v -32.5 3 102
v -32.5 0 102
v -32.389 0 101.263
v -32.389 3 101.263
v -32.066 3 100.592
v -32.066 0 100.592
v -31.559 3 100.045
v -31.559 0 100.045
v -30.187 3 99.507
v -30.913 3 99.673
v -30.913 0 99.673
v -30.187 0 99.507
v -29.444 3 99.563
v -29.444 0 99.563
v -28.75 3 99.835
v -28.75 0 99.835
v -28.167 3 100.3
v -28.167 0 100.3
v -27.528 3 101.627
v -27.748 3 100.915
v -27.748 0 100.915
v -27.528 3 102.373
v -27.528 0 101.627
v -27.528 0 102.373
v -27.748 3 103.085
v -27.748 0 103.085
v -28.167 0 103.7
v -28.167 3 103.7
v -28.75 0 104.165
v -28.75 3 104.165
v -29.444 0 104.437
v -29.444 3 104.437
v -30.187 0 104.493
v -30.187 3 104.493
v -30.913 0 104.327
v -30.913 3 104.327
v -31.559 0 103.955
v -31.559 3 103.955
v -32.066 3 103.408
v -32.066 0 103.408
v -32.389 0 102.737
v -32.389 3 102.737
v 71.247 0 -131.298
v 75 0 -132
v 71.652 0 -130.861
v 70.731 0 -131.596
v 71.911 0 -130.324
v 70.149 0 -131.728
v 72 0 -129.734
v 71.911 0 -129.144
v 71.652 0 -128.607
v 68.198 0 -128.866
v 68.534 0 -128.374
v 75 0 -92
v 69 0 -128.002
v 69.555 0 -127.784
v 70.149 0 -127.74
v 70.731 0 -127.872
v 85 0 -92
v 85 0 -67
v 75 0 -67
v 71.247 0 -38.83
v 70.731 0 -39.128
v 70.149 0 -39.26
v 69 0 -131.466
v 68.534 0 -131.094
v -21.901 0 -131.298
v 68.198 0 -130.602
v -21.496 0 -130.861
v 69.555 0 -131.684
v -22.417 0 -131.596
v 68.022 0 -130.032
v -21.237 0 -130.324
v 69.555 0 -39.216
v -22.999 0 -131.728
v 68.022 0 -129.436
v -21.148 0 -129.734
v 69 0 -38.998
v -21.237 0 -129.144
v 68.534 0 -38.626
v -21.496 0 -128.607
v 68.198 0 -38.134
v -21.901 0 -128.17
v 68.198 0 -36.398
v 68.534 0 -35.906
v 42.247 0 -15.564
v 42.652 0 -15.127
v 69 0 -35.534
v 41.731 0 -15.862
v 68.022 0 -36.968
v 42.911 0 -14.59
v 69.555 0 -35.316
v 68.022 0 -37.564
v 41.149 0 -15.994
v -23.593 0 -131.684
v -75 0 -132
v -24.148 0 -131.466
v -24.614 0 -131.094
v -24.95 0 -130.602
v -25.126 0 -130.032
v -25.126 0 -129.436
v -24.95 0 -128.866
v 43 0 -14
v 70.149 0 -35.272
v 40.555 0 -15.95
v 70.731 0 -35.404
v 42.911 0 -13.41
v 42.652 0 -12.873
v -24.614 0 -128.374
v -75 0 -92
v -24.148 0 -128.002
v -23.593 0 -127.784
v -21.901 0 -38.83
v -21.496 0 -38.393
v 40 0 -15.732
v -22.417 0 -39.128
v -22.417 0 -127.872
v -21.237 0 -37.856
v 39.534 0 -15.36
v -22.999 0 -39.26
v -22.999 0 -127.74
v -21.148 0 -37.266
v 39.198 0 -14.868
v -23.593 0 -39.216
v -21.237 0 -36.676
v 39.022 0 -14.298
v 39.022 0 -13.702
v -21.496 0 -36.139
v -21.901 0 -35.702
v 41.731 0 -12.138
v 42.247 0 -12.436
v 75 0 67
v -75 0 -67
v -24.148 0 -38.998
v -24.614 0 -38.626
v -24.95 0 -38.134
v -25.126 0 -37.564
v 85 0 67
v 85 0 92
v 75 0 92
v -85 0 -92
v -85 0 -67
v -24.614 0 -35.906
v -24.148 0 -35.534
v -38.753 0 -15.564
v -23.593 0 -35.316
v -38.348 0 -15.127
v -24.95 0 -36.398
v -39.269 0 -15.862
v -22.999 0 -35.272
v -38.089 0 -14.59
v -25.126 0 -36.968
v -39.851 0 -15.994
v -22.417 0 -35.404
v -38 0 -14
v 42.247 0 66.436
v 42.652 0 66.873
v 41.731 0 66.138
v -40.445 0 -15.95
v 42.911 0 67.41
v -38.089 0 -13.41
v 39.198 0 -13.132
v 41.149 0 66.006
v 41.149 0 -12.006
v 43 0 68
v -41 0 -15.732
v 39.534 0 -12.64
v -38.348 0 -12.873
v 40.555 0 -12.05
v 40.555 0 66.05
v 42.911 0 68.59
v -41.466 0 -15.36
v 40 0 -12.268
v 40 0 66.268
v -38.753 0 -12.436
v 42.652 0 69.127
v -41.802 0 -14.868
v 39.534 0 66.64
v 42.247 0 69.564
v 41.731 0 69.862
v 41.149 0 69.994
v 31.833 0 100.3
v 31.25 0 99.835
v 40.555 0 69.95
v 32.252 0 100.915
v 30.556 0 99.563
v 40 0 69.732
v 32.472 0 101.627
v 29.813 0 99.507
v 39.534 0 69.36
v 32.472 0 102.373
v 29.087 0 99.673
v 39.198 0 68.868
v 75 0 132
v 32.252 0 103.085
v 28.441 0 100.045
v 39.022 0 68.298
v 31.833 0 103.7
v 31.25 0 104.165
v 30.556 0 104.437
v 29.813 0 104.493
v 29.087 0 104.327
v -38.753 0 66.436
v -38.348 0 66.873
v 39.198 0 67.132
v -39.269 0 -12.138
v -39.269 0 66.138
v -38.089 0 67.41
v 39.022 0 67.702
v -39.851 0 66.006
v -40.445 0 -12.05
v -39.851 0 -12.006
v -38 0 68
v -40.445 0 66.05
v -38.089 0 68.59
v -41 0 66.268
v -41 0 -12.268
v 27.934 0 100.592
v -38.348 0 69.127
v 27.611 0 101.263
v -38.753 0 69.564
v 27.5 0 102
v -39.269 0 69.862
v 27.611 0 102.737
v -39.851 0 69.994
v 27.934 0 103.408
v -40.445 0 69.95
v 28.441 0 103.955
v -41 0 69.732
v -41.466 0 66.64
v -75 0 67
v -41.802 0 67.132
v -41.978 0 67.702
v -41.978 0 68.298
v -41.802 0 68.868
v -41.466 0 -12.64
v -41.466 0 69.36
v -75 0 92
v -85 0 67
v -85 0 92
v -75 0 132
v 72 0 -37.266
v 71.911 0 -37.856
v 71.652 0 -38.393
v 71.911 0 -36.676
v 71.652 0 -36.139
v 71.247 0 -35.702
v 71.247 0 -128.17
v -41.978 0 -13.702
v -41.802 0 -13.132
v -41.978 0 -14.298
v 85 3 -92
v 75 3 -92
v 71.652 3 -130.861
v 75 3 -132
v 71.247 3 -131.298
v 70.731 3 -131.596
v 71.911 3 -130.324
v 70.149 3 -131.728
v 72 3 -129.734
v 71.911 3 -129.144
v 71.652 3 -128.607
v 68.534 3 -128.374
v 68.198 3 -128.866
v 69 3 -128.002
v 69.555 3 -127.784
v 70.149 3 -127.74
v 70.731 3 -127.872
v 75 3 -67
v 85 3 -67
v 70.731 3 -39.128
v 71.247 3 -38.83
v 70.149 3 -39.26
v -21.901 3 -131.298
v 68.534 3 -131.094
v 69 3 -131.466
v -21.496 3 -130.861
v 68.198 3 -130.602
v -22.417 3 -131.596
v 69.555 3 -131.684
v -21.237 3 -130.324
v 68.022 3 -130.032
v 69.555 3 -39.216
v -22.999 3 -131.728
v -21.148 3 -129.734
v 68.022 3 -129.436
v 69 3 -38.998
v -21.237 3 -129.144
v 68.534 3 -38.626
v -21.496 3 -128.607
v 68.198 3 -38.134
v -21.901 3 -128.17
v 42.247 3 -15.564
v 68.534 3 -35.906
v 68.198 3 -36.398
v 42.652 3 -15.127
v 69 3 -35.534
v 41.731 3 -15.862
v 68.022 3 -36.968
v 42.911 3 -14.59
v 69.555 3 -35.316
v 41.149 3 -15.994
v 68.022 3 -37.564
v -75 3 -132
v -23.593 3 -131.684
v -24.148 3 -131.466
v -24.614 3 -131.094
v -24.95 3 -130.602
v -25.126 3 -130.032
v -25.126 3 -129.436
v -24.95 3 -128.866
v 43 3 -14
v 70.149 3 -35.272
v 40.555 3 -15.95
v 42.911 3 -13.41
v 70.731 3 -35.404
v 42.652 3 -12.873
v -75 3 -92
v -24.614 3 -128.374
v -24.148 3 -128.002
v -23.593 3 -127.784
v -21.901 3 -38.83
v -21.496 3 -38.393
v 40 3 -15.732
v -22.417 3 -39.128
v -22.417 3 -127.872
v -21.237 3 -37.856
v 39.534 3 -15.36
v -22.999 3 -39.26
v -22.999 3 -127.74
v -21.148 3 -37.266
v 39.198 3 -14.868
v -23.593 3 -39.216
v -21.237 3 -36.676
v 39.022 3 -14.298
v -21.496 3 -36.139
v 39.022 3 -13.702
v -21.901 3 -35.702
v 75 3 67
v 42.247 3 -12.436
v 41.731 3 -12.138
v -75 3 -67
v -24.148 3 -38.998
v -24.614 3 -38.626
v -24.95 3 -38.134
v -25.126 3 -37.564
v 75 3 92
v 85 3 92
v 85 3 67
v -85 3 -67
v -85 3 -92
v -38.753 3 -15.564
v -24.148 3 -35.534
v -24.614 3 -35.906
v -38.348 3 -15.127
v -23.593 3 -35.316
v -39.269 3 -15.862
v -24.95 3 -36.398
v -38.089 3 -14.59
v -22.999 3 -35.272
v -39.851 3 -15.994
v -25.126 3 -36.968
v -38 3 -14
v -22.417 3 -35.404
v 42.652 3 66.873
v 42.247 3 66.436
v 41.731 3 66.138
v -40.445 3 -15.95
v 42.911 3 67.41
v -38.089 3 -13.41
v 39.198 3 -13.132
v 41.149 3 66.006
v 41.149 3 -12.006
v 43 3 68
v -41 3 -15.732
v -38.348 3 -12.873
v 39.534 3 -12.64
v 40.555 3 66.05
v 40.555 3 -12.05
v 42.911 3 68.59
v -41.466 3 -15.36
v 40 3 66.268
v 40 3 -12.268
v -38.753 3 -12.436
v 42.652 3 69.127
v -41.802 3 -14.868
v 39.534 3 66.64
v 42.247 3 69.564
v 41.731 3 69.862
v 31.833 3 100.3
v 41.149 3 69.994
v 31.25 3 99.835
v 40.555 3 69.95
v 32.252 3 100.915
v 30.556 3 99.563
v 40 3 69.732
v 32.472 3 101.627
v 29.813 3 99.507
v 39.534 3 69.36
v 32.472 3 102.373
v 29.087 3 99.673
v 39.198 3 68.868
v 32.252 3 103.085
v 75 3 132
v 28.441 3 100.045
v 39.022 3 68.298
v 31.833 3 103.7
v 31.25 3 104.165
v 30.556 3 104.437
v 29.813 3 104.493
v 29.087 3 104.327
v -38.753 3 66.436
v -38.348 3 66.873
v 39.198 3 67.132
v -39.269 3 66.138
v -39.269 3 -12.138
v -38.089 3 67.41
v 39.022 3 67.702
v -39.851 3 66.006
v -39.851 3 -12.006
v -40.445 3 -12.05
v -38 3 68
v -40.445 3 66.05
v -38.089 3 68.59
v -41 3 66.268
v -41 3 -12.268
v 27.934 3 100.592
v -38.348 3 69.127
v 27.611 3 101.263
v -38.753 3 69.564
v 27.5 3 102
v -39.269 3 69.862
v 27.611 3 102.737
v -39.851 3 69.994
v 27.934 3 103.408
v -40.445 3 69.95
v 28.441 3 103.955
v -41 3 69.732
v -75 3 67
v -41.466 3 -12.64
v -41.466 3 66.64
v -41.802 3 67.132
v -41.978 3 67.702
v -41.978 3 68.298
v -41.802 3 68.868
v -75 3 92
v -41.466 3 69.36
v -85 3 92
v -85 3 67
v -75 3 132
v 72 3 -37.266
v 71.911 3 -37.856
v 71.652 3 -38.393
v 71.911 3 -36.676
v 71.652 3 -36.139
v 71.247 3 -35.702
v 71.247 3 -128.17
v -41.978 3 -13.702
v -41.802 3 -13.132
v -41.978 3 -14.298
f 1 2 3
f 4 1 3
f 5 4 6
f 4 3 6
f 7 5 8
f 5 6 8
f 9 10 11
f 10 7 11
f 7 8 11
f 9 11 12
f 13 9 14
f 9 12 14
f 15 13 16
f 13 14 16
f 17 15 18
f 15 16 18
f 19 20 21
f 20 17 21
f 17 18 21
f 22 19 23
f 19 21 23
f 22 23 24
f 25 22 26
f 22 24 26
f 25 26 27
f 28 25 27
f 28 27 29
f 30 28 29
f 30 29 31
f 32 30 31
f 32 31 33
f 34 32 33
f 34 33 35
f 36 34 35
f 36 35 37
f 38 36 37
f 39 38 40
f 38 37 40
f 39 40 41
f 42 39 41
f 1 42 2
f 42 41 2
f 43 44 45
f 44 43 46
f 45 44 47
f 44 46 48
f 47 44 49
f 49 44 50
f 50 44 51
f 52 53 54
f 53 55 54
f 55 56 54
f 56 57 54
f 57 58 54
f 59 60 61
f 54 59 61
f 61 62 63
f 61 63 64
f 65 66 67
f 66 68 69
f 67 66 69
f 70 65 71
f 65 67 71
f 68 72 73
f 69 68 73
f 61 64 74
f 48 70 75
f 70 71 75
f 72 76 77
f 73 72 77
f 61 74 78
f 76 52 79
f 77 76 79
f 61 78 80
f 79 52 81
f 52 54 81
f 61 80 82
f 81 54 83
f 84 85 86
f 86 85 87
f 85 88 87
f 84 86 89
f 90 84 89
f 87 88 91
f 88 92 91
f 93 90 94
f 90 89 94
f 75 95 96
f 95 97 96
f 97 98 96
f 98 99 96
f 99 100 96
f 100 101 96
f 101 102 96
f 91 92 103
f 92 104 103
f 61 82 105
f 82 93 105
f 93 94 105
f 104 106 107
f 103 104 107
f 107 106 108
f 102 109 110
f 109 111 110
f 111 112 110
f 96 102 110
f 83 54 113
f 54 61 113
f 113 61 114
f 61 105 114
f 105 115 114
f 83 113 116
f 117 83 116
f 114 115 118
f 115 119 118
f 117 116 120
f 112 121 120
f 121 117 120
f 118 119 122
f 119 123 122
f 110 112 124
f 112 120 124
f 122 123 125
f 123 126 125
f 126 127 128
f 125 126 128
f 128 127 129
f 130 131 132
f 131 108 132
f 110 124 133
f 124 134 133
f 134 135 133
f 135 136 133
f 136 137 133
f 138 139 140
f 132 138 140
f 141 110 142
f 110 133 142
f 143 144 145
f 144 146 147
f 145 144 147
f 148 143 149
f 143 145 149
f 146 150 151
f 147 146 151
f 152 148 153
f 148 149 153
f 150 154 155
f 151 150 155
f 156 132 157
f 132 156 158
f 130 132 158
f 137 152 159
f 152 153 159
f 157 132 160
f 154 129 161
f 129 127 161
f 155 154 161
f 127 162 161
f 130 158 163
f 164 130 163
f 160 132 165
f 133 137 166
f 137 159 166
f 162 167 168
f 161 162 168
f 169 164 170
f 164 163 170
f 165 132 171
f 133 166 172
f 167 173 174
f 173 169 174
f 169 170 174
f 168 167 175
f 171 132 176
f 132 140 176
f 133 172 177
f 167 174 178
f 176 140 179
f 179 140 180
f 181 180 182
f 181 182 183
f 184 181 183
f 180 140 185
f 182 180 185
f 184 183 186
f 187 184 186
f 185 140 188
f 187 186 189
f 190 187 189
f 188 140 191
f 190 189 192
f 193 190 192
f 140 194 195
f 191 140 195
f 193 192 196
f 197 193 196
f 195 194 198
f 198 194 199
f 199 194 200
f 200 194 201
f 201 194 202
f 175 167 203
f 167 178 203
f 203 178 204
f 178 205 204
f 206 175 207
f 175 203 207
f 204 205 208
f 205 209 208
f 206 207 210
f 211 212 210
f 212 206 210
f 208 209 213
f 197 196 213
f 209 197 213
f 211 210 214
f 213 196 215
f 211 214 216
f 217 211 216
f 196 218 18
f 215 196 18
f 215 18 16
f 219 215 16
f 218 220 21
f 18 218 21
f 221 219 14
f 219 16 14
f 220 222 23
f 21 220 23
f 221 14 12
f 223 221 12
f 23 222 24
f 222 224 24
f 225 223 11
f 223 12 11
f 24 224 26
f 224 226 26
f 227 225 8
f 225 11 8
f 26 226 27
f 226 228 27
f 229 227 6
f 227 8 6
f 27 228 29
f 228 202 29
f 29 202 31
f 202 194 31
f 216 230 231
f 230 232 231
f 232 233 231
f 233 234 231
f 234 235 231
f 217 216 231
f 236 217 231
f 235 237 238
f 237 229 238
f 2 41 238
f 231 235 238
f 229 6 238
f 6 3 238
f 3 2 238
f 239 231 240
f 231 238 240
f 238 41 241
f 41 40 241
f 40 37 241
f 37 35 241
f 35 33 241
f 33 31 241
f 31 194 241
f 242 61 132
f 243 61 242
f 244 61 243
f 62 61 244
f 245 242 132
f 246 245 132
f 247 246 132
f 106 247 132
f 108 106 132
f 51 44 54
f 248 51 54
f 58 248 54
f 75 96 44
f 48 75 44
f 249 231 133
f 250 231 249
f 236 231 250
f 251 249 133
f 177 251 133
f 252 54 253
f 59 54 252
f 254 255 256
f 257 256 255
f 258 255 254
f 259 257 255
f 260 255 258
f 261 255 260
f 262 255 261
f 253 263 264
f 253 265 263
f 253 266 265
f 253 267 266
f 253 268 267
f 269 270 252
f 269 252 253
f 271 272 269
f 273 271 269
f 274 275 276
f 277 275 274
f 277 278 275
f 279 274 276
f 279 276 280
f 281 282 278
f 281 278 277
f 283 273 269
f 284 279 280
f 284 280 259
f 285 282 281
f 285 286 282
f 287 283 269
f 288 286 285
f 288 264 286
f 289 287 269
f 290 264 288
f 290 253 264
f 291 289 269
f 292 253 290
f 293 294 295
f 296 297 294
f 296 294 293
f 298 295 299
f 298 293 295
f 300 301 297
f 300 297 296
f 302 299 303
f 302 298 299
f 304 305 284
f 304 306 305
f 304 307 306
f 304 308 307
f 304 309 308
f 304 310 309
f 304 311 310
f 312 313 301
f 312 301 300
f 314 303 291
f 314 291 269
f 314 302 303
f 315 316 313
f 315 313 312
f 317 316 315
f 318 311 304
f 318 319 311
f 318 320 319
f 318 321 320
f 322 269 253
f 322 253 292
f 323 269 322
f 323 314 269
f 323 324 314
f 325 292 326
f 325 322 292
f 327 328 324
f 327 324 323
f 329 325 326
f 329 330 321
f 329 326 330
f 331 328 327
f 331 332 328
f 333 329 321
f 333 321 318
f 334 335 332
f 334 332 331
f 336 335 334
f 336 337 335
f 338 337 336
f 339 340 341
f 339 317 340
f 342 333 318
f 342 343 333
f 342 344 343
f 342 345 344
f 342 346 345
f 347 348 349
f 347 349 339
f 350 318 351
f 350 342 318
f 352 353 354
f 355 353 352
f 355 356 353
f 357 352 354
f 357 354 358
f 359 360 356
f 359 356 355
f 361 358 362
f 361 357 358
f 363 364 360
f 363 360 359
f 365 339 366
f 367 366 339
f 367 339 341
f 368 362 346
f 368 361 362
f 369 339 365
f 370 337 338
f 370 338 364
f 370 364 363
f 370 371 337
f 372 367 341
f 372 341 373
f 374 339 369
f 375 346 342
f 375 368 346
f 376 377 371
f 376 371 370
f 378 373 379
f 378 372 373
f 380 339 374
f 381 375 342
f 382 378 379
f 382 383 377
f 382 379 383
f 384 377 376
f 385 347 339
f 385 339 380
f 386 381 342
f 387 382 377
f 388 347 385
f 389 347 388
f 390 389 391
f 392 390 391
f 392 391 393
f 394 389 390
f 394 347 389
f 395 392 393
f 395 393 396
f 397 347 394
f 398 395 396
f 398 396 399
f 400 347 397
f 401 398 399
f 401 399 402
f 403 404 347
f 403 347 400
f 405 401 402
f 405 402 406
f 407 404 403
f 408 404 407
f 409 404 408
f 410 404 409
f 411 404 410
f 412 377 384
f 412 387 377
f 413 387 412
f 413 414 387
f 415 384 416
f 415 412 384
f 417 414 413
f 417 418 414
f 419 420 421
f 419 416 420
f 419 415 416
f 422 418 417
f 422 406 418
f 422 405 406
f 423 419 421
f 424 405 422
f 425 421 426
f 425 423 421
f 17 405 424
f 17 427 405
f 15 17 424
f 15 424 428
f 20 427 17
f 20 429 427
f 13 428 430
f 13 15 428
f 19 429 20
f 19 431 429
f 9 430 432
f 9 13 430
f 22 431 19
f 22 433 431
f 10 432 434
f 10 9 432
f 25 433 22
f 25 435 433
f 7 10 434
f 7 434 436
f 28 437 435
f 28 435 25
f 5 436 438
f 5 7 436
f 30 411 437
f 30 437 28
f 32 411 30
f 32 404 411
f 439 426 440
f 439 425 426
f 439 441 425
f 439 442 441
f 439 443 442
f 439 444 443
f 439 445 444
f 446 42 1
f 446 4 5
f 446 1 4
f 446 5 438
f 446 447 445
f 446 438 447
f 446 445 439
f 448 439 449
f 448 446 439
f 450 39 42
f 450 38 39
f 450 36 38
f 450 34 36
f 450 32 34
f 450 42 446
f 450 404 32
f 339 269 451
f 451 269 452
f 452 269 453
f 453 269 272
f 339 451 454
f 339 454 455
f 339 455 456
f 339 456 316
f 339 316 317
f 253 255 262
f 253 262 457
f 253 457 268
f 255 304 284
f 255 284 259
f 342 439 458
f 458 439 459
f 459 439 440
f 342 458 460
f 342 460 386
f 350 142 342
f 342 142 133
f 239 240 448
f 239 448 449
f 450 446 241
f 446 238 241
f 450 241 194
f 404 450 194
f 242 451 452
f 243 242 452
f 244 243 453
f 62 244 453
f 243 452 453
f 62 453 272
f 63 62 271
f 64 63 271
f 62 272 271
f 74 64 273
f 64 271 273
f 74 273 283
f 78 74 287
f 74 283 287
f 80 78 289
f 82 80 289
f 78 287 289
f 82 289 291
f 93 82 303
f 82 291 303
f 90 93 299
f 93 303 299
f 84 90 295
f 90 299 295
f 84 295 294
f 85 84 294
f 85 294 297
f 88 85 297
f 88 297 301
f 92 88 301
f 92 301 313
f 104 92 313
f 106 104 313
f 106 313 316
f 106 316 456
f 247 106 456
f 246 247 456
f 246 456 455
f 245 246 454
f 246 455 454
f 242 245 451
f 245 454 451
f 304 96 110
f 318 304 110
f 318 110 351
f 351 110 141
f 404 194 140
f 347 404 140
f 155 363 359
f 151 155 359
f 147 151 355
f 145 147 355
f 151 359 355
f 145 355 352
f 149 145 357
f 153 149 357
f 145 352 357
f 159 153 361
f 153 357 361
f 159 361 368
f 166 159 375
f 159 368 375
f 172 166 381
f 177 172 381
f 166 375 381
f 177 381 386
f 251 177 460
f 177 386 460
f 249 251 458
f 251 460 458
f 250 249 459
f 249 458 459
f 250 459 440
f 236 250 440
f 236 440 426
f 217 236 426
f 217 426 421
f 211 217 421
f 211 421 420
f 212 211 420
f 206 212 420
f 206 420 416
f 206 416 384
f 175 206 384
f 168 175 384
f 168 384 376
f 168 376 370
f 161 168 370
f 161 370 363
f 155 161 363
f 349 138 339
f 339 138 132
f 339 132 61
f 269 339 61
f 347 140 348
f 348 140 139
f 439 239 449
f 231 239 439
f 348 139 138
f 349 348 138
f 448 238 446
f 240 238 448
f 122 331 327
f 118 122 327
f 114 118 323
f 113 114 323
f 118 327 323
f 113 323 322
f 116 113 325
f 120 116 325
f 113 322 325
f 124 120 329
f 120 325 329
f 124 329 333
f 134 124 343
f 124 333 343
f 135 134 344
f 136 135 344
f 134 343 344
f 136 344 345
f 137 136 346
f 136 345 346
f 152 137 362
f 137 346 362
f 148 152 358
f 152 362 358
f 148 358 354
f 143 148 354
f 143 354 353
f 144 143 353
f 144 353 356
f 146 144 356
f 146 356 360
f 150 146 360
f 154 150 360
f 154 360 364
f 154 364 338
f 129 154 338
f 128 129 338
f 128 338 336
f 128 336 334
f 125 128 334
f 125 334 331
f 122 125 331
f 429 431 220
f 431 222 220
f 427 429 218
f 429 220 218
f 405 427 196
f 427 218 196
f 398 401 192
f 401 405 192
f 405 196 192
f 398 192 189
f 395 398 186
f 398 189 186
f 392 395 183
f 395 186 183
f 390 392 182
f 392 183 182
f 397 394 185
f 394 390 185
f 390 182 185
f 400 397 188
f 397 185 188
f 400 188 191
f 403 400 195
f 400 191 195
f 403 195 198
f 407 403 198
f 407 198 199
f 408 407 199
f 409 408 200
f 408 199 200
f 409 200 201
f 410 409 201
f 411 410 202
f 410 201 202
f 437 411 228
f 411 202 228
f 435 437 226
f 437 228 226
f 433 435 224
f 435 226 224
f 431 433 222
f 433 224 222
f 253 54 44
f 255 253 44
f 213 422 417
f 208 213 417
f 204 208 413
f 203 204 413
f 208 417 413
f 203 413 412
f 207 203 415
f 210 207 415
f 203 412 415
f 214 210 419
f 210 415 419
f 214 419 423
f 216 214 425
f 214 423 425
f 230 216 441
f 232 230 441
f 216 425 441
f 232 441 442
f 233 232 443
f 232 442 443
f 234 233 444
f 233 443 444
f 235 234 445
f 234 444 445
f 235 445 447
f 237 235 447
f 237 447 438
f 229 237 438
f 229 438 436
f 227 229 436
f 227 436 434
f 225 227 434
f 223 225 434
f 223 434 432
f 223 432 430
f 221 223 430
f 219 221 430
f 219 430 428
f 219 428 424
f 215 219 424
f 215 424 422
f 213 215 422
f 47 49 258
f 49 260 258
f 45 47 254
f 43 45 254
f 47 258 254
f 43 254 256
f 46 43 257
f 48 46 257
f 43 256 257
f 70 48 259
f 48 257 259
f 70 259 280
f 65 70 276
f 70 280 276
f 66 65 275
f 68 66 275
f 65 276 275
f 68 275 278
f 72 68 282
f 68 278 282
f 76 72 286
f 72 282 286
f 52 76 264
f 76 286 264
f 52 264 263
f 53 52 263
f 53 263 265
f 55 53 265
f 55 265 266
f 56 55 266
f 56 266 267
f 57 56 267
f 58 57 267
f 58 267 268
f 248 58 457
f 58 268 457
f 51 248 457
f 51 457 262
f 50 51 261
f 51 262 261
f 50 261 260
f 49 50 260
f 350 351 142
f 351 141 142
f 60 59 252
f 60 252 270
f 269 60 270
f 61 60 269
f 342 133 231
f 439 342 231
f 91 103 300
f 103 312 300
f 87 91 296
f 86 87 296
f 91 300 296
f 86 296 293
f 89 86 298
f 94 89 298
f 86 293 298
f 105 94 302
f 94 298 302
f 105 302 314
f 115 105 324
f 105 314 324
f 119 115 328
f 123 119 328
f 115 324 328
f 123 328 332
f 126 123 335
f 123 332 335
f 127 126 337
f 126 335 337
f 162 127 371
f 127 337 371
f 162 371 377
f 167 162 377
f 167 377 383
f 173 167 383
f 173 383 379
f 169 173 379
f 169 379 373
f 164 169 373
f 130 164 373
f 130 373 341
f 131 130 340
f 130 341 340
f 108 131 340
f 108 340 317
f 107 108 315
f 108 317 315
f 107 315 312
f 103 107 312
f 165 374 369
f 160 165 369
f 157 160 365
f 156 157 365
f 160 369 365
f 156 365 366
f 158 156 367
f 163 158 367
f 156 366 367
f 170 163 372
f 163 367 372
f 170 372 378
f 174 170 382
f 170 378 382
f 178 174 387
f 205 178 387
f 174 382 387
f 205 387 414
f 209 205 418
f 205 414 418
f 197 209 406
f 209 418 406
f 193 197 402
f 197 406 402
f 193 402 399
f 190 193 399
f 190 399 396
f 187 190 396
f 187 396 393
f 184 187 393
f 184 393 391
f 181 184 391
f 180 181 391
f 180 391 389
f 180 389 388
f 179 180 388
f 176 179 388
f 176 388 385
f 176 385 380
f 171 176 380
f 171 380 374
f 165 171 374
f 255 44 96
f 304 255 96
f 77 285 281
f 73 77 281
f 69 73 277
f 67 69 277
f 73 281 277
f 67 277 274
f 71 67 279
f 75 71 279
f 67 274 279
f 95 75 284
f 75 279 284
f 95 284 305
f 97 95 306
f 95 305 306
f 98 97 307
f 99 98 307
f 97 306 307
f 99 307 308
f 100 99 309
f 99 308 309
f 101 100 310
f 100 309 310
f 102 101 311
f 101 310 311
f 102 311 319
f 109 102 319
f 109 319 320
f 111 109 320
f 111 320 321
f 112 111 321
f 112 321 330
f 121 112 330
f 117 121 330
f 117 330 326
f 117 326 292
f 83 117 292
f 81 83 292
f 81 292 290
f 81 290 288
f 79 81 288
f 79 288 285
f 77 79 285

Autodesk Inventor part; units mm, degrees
ref_plane "YZ Plane" through (0, 0, 0) normal (1, 0, 0) x (0, 1, 0)
ref_plane "XZ Plane" through (0, 0, 0) normal (0, 1, 0) x (-1, 0, 0)
ref_plane "XY Plane" through (0, 0, 0) normal (0, 0, 1) x (1, 0, 0)
sketch "Sketch1" plane through (0, 0, 0) normal (0, 1, 0) x (-1, 0, 0)
  line L0 (75, 132) -> (-75, 132)
  line L1 (-75, -132) -> (75, -132)
  line L2 (75, 132) -> (-75, -132) construction
  line L3 (-75, 132) -> (75, -132) construction
  line L4 (75, 92) -> (85, 92)
  line L5 (85, 92) -> (85, 67)
  line L6 (85, 67) -> (75, 67)
  line L7 (75, 92) -> (75, 132)
  line L8 (0, 0) -> (94, 0)
  line L9 (75, -92) -> (85, -92)
  line L10 (85, -92) -> (85, -67)
  line L11 (85, -67) -> (75, -67)
  line L12 (75, -132) -> (75, -92)
  line L13 (75, -67) -> (75, 67)
  line L14 (-75, 92) -> (-85, 92)
  line L15 (-85, 92) -> (-85, 67)
  line L16 (-85, 67) -> (-75, 67)
  line L17 (-75, 132) -> (-75, 92)
  line L18 (-75, -92) -> (-85, -92)
  line L19 (-85, -92) -> (-85, -67)
  line L20 (-85, -67) -> (-75, -67)
  line L21 (-75, 67) -> (-75, -67)
  line L22 (-75, -92) -> (-75, -132)
  circle A0 centre (30, 102) radius 2.5
  circle A1 centre (-30, 102) radius 2.5
  dimension "d0" = 264
  dimension "d1" = 150
  dimension "d4" = 10
  dimension "d5" = 25
  dimension "d6" = 40
  dimension "d7" = 10
  dimension "d8" = 9
  dimension "d9" = 10
  dimension "d10" = 25
  dimension "d11" = 40
  dimension "d12" = 160
  dimension "d17" = 5
  dimension "d18" = 5
  dimension "d19" = 30
  dimension "d20" = 30
  dimension "d21" = 45
  dimension "d22" = 45
extrude "Extrusion1" add sketch "Sketch1" along normal blind 3
sketch "Sketch2" plane through (0, 3, 0) normal (0, 1, 0) x (1, 0, 0)
  line L0 (-86, -72) -> (86, -72)
  line L1 (-75, -132) -> (75, -132) projected
  line L2 (45, -72) -> (45, 18)
  line L3 (75, -67) -> (75, 67) projected
  line L4 (45, 18) -> (-44, 18)
  line L5 (-44, 18) -> (-44, -72)
  line L6 (-75, 67) -> (-75, -67) projected
  circle A0 centre (41, -68) radius 2
  circle A1 centre (41, 14) radius 2
  circle A2 centre (-40, 14) radius 2
  circle A3 centre (-40, -68) radius 2
  circle A4 centre (70, 129.734) radius 2
  line L7 (75, 132) -> (-75, 132) projected
  circle A5 centre (70, 37.266) radius 2
  circle A6 centre (-23.148, 129.734) radius 2
  circle A7 centre (-23.148, 37.266) radius 2
  point P0 (0, 0)
  dimension "d15" = 60
  dimension "d16" = 30
  dimension "d23" = 90
  dimension "d25" = 4
  dimension "d26" = 4
  dimension "d27" = 4
  dimension "d28" = 4
  dimension "d29" = 4
  dimension "d30" = 4
  dimension "d31" = 4
  dimension "d32" = 4
  dimension "d33" = 4
  dimension "d34" = 4
  dimension "d35" = 4
  dimension "d36" = 4
  dimension "d39" = 89
  dimension "d40" = 4
  dimension "d41" = 5
  dimension "d42" = 2.266
  dimension "d43" = 4
  dimension "d44" = 5
  dimension "d45" = 92.468
  dimension "d46" = 4
  dimension "d47" = 4
  dimension "d48" = 93.148
  dimension "d49" = 93.148
  dimension "d50" = 2.266
  dimension "d51" = 0
extrude "Extrusion2" cut sketch "Sketch2" against normal blind 3 contours A0 | A1 | A2 | A3 | A4 | A5 | A6 | A7
properties part number "bottom_part"
